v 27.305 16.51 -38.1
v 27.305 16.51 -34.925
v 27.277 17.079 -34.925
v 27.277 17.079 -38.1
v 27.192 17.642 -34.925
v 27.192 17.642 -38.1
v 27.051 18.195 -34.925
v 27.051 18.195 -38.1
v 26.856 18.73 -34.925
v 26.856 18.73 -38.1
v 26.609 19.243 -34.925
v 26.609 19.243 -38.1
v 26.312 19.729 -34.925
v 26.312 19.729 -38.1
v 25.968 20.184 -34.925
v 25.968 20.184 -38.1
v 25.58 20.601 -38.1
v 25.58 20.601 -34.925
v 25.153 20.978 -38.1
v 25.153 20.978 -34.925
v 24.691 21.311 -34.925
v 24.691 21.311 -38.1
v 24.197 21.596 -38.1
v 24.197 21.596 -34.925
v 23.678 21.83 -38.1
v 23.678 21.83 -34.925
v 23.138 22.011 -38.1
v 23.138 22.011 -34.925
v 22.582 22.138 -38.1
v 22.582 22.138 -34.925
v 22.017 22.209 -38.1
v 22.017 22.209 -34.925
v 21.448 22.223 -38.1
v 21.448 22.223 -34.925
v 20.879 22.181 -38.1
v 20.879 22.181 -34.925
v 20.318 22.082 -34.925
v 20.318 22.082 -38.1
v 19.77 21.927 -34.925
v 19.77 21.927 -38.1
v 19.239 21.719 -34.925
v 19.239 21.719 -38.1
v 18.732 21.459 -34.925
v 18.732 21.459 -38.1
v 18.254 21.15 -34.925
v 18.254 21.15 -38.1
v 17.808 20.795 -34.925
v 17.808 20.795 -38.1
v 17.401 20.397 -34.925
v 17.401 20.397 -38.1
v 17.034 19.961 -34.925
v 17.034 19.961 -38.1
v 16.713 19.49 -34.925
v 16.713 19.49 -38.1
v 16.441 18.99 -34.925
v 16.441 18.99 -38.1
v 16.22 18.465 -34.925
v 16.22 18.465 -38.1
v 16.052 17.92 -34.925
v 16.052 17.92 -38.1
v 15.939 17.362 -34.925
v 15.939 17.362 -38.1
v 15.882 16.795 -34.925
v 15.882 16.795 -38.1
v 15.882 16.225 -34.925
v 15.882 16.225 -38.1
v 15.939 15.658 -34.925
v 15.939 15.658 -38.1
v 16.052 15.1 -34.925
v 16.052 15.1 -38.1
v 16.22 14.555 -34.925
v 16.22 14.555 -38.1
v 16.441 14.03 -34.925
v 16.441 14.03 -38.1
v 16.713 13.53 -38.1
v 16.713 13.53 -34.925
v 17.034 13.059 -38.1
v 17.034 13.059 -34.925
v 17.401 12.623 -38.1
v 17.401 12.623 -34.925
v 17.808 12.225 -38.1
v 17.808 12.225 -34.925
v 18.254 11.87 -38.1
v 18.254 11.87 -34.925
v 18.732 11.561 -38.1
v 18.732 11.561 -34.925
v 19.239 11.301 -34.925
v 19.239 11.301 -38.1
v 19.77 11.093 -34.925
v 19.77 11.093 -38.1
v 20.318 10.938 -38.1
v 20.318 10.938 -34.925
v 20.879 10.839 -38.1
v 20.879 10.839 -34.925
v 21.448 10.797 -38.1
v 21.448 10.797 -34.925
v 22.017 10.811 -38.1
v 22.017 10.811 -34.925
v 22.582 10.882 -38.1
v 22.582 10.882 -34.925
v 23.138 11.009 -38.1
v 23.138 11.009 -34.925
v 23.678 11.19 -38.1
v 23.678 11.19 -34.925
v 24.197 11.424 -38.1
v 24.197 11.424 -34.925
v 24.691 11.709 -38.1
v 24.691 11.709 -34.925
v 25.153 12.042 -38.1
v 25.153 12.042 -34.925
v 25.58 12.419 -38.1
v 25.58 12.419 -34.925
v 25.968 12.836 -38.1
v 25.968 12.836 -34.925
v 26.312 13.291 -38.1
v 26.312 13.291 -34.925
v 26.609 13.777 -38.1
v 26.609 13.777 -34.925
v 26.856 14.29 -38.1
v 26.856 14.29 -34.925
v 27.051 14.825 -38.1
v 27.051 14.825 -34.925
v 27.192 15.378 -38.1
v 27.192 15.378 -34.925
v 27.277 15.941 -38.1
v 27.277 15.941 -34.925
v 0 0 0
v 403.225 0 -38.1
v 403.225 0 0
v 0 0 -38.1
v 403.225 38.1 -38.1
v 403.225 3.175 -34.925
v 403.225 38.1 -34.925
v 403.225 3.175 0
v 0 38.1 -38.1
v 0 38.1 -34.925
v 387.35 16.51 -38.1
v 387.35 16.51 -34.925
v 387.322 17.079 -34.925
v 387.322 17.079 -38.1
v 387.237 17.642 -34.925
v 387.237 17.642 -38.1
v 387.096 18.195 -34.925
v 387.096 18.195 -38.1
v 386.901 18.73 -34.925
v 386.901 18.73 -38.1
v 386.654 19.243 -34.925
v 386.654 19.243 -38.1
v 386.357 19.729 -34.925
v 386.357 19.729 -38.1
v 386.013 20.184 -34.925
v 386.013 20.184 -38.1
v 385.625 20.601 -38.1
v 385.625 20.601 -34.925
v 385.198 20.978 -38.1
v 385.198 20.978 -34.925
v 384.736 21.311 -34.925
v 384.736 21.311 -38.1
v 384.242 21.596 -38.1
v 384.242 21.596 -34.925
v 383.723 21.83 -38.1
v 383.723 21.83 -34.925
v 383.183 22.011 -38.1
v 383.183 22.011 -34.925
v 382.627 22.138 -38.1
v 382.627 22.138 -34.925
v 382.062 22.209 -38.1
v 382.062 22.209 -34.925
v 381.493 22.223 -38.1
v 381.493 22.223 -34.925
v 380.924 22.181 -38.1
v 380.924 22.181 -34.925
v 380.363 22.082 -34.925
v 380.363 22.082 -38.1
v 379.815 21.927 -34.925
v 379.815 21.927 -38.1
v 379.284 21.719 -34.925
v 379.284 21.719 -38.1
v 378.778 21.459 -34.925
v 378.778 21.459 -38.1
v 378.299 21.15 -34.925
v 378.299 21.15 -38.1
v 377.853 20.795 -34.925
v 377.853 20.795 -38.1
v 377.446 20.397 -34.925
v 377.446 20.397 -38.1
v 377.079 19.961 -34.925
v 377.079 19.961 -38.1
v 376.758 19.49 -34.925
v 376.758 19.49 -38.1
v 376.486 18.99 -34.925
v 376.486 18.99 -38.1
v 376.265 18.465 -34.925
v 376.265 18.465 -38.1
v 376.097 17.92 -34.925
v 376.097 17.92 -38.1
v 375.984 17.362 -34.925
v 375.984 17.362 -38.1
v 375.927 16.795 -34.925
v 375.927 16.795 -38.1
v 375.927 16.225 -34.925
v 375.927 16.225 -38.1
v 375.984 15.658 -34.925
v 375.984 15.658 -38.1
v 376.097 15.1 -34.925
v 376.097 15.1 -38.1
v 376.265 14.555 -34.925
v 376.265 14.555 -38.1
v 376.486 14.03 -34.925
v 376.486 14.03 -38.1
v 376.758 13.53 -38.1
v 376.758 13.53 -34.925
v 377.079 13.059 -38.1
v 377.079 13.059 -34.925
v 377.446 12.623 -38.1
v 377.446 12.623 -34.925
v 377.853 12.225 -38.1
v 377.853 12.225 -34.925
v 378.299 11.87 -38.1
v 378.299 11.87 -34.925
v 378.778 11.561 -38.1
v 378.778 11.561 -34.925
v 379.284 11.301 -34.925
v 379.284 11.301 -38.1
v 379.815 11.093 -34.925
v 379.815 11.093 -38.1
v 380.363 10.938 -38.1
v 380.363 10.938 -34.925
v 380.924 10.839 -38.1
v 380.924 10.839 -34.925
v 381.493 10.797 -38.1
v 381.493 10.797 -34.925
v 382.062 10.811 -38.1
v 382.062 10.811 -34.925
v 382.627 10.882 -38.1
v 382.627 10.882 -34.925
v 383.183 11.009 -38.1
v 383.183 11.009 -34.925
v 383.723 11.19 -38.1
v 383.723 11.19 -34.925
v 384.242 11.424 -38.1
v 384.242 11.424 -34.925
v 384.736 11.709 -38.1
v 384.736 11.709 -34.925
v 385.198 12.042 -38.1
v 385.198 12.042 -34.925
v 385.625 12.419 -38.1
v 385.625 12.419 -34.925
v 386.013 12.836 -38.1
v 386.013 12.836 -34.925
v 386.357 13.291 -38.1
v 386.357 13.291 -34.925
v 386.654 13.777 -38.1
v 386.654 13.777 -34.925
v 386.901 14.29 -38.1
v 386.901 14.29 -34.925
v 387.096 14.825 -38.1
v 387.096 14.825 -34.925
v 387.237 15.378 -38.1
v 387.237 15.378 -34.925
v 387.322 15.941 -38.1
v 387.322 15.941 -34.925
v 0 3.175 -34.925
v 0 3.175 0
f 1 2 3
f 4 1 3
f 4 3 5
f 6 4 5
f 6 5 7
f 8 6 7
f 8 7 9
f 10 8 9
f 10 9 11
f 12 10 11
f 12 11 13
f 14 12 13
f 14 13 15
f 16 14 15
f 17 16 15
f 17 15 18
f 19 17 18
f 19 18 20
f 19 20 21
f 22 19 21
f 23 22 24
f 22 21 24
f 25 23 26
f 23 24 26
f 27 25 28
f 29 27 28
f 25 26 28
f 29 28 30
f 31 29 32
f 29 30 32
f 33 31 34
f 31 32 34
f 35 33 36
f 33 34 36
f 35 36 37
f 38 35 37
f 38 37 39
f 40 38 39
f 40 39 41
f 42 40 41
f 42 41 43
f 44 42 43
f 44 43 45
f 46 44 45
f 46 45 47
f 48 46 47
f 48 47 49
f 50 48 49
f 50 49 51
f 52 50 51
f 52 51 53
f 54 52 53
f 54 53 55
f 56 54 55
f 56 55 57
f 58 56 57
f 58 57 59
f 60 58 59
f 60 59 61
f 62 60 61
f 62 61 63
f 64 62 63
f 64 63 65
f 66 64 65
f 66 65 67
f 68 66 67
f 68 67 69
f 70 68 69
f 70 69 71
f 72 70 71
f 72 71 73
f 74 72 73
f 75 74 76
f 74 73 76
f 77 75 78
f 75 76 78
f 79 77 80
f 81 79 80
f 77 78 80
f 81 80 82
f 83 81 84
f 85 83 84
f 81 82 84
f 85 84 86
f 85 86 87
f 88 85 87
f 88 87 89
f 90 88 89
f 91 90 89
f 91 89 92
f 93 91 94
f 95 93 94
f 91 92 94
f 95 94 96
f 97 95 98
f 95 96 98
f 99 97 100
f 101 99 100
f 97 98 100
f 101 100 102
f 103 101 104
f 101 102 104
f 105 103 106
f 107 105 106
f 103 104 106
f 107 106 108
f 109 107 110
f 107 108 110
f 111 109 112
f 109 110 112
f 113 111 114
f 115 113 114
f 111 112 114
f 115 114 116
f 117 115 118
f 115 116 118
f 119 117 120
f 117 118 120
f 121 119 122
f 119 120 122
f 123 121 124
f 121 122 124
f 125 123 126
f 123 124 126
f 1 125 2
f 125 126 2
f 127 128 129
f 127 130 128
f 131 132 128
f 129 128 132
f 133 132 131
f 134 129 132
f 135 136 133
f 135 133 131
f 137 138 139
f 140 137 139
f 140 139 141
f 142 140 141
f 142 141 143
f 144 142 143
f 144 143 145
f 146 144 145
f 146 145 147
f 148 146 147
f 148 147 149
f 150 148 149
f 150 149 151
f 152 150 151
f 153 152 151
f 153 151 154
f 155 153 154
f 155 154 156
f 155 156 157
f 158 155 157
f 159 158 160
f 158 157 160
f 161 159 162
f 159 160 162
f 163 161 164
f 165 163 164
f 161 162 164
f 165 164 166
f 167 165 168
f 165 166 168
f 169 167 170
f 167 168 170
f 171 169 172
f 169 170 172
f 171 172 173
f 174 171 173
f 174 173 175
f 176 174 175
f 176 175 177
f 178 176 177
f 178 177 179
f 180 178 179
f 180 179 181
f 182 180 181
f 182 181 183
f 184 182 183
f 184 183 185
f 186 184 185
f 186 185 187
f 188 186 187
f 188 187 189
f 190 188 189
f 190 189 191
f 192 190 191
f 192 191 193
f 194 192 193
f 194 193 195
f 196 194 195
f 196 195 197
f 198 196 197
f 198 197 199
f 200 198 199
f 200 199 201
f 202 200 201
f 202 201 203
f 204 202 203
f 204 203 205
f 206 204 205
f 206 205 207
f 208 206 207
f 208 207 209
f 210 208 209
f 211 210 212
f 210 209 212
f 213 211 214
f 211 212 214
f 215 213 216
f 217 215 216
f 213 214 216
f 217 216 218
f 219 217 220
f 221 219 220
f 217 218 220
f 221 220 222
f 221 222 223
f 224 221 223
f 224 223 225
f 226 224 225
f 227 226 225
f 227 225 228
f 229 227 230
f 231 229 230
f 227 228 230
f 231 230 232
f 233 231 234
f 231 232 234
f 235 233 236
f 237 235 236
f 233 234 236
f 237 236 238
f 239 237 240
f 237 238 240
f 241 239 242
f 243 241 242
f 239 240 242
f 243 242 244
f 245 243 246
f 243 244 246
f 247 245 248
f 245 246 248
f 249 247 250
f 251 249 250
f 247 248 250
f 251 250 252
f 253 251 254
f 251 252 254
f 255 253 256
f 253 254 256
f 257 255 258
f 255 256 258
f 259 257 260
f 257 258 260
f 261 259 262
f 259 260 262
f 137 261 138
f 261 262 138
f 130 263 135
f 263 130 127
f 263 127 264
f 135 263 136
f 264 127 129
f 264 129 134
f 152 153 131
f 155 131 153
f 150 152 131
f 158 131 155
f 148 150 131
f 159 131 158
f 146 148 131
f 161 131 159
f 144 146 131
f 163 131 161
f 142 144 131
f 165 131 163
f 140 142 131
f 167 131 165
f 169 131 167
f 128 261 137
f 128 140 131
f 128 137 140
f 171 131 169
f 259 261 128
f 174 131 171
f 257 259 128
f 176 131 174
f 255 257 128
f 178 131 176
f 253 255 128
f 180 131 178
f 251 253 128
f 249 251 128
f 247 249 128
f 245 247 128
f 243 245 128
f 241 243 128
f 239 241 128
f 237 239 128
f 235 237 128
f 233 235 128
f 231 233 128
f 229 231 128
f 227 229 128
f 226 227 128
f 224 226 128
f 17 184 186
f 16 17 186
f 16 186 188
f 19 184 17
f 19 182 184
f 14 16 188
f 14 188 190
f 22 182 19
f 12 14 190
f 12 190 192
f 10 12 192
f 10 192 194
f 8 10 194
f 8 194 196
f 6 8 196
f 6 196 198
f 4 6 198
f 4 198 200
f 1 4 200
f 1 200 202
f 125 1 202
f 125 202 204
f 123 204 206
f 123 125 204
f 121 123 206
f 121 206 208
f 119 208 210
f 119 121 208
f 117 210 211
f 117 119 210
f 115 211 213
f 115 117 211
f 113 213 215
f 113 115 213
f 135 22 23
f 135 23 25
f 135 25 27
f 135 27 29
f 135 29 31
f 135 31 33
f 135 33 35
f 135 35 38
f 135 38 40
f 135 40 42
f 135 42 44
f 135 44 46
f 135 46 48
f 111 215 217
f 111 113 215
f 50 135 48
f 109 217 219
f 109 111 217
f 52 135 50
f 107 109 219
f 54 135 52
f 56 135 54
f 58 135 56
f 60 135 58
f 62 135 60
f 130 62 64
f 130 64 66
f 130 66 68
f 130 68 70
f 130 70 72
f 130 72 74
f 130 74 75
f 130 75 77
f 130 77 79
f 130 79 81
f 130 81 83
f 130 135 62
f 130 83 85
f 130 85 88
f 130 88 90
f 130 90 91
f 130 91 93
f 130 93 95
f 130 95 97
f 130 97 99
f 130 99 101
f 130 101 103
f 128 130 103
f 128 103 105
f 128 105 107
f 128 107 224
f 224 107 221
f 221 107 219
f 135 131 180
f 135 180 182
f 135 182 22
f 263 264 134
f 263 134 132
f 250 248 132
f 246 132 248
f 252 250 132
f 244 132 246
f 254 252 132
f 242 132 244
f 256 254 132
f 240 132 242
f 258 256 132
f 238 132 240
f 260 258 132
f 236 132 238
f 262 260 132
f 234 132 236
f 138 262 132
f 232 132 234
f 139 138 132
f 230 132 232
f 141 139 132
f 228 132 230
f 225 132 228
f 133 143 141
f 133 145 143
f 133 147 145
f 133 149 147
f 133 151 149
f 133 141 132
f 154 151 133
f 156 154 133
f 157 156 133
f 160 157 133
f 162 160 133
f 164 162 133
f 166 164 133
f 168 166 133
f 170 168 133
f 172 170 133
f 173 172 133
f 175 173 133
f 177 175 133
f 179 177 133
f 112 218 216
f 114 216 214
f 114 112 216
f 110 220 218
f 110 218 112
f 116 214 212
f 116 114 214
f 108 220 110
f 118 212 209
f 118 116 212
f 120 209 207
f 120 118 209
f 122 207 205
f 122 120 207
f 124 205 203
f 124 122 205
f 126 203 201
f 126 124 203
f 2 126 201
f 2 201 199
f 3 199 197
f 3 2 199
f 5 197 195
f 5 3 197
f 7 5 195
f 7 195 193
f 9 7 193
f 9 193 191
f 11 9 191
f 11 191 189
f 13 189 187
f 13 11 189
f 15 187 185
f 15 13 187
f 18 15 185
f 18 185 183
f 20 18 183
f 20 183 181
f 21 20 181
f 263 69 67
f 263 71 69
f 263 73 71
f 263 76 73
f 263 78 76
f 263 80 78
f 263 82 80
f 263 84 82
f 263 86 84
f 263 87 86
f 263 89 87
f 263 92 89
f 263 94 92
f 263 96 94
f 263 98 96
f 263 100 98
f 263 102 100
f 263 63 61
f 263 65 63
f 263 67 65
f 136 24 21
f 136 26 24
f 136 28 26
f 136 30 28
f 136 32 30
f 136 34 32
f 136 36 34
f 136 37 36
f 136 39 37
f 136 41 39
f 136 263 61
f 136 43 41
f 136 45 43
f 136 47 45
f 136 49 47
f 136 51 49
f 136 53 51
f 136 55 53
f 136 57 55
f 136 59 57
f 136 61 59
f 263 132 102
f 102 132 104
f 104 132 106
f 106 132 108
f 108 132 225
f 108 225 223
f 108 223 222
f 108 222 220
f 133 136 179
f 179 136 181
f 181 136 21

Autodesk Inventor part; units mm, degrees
ref_plane "YZ Plane" through (0, 0, 0) normal (1, 0, 0) x (0, 1, 0)
ref_plane "XZ Plane" through (0, 0, 0) normal (0, 1, 0) x (-1, 0, 0)
ref_plane "XY Plane" through (0, 0, 0) normal (0, 0, 1) x (1, 0, 0)
sketch "Sketch1" plane through (0, 0, 0) normal (1, 0, 0) x (0, 1, 0)
  line L0 (3.175, 0) -> (3.175, -34.925)
  line L1 (3.175, -34.925) -> (38.1, -34.925)
  line L2 (38.1, -34.925) -> (38.1, -38.1)
  line L3 (38.1, -38.1) -> (0, -38.1)
  line L4 (0, -38.1) -> (0, 0)
  line L5 (0, 0) -> (3.175, 0)
  dimension "d0" = 3.175
  dimension "d1" = 3.175
  dimension "d2" = 38.1
  dimension "d3" = 38.1
  dimension "d4" = 0
  dimension "d5" = 0
extrude "Extrusion1" add sketch "Sketch1" along normal blind 403.225
sketch "Sketch2" plane through (0, 3.175, -34.925) normal (0, 0, 1) x (1, 0, 0)
  circle A0 centre (381.635, 13.335) radius 5.715
  line L0 (0, -3.175) -> (403.225, -3.175) projected
  line L1 (403.225, 34.925) -> (403.225, 0) projected
  line L2 (0, 0) -> (403.225, 0) projected
  dimension "d9" = 21.59
  dimension "d10" = 11.43
  dimension "d18" = 13.335
extrude "Extrusion2" cut sketch "Sketch2" against normal blind 25.4
sketch "Sketch3" plane through (0, 3.175, -34.925) normal (0, 0, 1) x (1, 0, 0)
  circle A0 centre (21.59, 13.335) radius 5.715
  line L0 (0, 34.925) -> (0, -3.175) projected
  line L1 (0, 0) -> (403.225, 0) projected
  dimension "d13" = 21.59
  dimension "d14" = 11.43
  dimension "d15" = 13.335
extrude "Extrusion3" cut sketch "Sketch3" against normal blind 25.4
properties part number "Side bar2"
